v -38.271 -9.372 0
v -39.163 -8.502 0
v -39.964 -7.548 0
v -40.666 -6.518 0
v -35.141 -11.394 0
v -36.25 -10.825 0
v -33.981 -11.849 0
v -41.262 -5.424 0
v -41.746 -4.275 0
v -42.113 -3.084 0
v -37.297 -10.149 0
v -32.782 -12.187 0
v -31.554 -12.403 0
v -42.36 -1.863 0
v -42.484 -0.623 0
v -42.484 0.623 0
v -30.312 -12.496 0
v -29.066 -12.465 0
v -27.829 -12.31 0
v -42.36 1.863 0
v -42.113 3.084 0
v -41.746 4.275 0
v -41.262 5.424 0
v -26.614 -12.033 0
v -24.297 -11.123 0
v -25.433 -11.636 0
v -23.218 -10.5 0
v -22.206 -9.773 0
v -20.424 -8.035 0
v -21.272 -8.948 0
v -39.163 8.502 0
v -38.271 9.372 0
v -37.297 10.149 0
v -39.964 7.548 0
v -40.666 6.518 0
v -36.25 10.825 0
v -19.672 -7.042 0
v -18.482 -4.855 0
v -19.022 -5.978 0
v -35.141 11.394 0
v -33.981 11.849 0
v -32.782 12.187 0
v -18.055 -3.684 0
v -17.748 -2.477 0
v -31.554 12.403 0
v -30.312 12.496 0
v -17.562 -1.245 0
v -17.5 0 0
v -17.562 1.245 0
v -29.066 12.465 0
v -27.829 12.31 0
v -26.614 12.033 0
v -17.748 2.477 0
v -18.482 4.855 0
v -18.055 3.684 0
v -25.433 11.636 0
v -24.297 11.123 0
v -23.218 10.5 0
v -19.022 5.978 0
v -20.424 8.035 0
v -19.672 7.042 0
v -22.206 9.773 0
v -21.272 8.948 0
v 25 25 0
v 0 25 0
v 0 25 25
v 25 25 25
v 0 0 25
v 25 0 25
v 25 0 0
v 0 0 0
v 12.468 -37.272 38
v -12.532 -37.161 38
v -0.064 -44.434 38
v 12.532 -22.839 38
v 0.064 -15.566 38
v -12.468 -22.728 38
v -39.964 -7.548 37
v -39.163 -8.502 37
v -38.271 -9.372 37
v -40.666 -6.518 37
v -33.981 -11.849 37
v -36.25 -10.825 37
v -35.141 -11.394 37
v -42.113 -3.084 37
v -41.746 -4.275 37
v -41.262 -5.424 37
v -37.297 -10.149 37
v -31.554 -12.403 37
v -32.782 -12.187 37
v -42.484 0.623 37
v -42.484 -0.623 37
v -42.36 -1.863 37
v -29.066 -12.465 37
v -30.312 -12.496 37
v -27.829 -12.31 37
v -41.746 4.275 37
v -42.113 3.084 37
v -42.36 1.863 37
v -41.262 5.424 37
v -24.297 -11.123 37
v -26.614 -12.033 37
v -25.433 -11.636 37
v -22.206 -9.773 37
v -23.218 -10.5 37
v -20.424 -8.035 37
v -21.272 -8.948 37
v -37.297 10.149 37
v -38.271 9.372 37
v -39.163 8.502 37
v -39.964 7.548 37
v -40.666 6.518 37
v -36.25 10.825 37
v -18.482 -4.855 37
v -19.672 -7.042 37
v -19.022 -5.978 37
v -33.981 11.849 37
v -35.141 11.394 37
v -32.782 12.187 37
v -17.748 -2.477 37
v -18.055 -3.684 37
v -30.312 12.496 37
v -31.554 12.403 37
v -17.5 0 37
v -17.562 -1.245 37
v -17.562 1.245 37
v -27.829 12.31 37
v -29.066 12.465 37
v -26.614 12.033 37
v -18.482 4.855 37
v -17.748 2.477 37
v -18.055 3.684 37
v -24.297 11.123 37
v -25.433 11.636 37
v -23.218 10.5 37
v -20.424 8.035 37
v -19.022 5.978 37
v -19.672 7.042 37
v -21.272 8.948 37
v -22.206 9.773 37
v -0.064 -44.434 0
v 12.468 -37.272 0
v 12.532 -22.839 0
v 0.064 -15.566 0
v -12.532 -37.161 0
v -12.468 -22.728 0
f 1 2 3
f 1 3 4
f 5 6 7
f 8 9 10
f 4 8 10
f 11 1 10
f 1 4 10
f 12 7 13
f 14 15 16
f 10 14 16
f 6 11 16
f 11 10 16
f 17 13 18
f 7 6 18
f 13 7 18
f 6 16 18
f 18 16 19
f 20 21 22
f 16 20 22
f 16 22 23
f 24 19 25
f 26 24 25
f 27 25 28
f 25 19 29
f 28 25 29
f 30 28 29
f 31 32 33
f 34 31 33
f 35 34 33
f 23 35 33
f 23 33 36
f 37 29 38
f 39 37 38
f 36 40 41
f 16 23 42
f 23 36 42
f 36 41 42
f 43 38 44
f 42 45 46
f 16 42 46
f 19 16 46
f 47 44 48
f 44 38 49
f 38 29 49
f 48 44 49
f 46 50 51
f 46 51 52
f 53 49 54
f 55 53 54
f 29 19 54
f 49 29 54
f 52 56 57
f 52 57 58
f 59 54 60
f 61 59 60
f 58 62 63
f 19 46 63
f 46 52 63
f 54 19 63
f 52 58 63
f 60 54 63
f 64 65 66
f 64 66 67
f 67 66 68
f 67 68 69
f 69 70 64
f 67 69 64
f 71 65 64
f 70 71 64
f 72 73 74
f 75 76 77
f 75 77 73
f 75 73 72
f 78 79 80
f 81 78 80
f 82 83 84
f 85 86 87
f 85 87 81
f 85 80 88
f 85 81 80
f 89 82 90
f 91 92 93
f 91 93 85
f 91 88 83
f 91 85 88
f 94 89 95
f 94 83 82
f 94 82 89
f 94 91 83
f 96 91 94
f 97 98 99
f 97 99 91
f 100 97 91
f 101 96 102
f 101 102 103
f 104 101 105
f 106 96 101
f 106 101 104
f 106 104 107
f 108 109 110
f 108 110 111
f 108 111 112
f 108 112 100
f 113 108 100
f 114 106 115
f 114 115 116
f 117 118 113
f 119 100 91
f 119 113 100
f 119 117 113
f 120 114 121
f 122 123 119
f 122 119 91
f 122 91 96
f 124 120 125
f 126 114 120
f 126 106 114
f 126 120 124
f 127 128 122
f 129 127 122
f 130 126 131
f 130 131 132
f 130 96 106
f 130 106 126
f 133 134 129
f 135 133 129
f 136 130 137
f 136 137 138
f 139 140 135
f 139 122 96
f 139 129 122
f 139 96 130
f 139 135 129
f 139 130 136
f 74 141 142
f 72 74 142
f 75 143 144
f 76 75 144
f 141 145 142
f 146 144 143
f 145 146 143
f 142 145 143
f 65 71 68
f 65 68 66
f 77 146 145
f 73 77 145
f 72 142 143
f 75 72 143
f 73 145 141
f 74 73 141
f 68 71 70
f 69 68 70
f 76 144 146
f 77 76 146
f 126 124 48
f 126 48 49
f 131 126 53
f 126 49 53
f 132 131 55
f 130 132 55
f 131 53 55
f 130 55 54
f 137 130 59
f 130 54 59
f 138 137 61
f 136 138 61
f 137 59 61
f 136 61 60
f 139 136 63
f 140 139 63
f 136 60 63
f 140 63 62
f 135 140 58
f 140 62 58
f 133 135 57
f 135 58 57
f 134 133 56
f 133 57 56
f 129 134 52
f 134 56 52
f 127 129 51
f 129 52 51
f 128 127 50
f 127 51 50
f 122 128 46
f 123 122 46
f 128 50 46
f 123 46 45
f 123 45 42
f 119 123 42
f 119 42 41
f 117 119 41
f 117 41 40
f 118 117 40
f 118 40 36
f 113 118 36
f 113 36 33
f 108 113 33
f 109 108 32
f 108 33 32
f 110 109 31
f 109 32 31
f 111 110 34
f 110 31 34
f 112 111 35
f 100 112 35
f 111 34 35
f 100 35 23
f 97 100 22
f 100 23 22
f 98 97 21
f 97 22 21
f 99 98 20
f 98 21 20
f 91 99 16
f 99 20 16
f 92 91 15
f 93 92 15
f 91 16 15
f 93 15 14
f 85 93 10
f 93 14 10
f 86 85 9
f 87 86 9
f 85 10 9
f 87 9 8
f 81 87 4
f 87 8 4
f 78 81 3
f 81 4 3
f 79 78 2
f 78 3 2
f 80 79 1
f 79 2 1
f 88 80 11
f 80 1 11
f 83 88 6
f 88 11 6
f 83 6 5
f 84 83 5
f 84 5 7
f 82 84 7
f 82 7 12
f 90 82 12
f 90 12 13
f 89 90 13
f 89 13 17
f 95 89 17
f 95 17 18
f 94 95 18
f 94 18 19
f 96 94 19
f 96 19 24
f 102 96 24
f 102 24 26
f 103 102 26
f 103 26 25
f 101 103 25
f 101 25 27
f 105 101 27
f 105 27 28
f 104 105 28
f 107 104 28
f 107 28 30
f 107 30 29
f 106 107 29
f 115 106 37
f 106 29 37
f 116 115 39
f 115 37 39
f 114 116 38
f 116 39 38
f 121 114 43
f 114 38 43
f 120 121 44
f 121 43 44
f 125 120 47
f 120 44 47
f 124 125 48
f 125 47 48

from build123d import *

# Parameters (mm, degrees)
F0_W     = 25
F0_H     = 25
F1_DEPTH = 25
F2_R     = 12.5
F3_DEPTH = 37
F5_DEPTH = 38


with BuildPart() as f1:
    # F0 (on Top) → F1 (new body)
    with BuildSketch(Plane.XY):
        with Locations((12.5, 12.5)):
            Rectangle(F0_W, F0_H)
    extrude(amount=F1_DEPTH)


with BuildPart() as f3:
    # F2 (on Top) → F3 (new body)
    with BuildSketch(Plane.XY):
        with Locations((-30, 0)):
            Circle(F2_R)
    extrude(amount=F3_DEPTH)


with BuildPart() as f5:
    # F4 (on Top) → F5 (new body)
    with BuildSketch(Plane.XY):
        Polygon((0.064268, -15.566386), (-12.467742, -22.727535), (-12.53201, -37.161149), (-0.064268, -44.433614), (12.467742, -37.272465), (12.53201, -22.838851), align=None)
    extrude(amount=F5_DEPTH)


solid = Compound([f1.part, f3.part, f5.part])
